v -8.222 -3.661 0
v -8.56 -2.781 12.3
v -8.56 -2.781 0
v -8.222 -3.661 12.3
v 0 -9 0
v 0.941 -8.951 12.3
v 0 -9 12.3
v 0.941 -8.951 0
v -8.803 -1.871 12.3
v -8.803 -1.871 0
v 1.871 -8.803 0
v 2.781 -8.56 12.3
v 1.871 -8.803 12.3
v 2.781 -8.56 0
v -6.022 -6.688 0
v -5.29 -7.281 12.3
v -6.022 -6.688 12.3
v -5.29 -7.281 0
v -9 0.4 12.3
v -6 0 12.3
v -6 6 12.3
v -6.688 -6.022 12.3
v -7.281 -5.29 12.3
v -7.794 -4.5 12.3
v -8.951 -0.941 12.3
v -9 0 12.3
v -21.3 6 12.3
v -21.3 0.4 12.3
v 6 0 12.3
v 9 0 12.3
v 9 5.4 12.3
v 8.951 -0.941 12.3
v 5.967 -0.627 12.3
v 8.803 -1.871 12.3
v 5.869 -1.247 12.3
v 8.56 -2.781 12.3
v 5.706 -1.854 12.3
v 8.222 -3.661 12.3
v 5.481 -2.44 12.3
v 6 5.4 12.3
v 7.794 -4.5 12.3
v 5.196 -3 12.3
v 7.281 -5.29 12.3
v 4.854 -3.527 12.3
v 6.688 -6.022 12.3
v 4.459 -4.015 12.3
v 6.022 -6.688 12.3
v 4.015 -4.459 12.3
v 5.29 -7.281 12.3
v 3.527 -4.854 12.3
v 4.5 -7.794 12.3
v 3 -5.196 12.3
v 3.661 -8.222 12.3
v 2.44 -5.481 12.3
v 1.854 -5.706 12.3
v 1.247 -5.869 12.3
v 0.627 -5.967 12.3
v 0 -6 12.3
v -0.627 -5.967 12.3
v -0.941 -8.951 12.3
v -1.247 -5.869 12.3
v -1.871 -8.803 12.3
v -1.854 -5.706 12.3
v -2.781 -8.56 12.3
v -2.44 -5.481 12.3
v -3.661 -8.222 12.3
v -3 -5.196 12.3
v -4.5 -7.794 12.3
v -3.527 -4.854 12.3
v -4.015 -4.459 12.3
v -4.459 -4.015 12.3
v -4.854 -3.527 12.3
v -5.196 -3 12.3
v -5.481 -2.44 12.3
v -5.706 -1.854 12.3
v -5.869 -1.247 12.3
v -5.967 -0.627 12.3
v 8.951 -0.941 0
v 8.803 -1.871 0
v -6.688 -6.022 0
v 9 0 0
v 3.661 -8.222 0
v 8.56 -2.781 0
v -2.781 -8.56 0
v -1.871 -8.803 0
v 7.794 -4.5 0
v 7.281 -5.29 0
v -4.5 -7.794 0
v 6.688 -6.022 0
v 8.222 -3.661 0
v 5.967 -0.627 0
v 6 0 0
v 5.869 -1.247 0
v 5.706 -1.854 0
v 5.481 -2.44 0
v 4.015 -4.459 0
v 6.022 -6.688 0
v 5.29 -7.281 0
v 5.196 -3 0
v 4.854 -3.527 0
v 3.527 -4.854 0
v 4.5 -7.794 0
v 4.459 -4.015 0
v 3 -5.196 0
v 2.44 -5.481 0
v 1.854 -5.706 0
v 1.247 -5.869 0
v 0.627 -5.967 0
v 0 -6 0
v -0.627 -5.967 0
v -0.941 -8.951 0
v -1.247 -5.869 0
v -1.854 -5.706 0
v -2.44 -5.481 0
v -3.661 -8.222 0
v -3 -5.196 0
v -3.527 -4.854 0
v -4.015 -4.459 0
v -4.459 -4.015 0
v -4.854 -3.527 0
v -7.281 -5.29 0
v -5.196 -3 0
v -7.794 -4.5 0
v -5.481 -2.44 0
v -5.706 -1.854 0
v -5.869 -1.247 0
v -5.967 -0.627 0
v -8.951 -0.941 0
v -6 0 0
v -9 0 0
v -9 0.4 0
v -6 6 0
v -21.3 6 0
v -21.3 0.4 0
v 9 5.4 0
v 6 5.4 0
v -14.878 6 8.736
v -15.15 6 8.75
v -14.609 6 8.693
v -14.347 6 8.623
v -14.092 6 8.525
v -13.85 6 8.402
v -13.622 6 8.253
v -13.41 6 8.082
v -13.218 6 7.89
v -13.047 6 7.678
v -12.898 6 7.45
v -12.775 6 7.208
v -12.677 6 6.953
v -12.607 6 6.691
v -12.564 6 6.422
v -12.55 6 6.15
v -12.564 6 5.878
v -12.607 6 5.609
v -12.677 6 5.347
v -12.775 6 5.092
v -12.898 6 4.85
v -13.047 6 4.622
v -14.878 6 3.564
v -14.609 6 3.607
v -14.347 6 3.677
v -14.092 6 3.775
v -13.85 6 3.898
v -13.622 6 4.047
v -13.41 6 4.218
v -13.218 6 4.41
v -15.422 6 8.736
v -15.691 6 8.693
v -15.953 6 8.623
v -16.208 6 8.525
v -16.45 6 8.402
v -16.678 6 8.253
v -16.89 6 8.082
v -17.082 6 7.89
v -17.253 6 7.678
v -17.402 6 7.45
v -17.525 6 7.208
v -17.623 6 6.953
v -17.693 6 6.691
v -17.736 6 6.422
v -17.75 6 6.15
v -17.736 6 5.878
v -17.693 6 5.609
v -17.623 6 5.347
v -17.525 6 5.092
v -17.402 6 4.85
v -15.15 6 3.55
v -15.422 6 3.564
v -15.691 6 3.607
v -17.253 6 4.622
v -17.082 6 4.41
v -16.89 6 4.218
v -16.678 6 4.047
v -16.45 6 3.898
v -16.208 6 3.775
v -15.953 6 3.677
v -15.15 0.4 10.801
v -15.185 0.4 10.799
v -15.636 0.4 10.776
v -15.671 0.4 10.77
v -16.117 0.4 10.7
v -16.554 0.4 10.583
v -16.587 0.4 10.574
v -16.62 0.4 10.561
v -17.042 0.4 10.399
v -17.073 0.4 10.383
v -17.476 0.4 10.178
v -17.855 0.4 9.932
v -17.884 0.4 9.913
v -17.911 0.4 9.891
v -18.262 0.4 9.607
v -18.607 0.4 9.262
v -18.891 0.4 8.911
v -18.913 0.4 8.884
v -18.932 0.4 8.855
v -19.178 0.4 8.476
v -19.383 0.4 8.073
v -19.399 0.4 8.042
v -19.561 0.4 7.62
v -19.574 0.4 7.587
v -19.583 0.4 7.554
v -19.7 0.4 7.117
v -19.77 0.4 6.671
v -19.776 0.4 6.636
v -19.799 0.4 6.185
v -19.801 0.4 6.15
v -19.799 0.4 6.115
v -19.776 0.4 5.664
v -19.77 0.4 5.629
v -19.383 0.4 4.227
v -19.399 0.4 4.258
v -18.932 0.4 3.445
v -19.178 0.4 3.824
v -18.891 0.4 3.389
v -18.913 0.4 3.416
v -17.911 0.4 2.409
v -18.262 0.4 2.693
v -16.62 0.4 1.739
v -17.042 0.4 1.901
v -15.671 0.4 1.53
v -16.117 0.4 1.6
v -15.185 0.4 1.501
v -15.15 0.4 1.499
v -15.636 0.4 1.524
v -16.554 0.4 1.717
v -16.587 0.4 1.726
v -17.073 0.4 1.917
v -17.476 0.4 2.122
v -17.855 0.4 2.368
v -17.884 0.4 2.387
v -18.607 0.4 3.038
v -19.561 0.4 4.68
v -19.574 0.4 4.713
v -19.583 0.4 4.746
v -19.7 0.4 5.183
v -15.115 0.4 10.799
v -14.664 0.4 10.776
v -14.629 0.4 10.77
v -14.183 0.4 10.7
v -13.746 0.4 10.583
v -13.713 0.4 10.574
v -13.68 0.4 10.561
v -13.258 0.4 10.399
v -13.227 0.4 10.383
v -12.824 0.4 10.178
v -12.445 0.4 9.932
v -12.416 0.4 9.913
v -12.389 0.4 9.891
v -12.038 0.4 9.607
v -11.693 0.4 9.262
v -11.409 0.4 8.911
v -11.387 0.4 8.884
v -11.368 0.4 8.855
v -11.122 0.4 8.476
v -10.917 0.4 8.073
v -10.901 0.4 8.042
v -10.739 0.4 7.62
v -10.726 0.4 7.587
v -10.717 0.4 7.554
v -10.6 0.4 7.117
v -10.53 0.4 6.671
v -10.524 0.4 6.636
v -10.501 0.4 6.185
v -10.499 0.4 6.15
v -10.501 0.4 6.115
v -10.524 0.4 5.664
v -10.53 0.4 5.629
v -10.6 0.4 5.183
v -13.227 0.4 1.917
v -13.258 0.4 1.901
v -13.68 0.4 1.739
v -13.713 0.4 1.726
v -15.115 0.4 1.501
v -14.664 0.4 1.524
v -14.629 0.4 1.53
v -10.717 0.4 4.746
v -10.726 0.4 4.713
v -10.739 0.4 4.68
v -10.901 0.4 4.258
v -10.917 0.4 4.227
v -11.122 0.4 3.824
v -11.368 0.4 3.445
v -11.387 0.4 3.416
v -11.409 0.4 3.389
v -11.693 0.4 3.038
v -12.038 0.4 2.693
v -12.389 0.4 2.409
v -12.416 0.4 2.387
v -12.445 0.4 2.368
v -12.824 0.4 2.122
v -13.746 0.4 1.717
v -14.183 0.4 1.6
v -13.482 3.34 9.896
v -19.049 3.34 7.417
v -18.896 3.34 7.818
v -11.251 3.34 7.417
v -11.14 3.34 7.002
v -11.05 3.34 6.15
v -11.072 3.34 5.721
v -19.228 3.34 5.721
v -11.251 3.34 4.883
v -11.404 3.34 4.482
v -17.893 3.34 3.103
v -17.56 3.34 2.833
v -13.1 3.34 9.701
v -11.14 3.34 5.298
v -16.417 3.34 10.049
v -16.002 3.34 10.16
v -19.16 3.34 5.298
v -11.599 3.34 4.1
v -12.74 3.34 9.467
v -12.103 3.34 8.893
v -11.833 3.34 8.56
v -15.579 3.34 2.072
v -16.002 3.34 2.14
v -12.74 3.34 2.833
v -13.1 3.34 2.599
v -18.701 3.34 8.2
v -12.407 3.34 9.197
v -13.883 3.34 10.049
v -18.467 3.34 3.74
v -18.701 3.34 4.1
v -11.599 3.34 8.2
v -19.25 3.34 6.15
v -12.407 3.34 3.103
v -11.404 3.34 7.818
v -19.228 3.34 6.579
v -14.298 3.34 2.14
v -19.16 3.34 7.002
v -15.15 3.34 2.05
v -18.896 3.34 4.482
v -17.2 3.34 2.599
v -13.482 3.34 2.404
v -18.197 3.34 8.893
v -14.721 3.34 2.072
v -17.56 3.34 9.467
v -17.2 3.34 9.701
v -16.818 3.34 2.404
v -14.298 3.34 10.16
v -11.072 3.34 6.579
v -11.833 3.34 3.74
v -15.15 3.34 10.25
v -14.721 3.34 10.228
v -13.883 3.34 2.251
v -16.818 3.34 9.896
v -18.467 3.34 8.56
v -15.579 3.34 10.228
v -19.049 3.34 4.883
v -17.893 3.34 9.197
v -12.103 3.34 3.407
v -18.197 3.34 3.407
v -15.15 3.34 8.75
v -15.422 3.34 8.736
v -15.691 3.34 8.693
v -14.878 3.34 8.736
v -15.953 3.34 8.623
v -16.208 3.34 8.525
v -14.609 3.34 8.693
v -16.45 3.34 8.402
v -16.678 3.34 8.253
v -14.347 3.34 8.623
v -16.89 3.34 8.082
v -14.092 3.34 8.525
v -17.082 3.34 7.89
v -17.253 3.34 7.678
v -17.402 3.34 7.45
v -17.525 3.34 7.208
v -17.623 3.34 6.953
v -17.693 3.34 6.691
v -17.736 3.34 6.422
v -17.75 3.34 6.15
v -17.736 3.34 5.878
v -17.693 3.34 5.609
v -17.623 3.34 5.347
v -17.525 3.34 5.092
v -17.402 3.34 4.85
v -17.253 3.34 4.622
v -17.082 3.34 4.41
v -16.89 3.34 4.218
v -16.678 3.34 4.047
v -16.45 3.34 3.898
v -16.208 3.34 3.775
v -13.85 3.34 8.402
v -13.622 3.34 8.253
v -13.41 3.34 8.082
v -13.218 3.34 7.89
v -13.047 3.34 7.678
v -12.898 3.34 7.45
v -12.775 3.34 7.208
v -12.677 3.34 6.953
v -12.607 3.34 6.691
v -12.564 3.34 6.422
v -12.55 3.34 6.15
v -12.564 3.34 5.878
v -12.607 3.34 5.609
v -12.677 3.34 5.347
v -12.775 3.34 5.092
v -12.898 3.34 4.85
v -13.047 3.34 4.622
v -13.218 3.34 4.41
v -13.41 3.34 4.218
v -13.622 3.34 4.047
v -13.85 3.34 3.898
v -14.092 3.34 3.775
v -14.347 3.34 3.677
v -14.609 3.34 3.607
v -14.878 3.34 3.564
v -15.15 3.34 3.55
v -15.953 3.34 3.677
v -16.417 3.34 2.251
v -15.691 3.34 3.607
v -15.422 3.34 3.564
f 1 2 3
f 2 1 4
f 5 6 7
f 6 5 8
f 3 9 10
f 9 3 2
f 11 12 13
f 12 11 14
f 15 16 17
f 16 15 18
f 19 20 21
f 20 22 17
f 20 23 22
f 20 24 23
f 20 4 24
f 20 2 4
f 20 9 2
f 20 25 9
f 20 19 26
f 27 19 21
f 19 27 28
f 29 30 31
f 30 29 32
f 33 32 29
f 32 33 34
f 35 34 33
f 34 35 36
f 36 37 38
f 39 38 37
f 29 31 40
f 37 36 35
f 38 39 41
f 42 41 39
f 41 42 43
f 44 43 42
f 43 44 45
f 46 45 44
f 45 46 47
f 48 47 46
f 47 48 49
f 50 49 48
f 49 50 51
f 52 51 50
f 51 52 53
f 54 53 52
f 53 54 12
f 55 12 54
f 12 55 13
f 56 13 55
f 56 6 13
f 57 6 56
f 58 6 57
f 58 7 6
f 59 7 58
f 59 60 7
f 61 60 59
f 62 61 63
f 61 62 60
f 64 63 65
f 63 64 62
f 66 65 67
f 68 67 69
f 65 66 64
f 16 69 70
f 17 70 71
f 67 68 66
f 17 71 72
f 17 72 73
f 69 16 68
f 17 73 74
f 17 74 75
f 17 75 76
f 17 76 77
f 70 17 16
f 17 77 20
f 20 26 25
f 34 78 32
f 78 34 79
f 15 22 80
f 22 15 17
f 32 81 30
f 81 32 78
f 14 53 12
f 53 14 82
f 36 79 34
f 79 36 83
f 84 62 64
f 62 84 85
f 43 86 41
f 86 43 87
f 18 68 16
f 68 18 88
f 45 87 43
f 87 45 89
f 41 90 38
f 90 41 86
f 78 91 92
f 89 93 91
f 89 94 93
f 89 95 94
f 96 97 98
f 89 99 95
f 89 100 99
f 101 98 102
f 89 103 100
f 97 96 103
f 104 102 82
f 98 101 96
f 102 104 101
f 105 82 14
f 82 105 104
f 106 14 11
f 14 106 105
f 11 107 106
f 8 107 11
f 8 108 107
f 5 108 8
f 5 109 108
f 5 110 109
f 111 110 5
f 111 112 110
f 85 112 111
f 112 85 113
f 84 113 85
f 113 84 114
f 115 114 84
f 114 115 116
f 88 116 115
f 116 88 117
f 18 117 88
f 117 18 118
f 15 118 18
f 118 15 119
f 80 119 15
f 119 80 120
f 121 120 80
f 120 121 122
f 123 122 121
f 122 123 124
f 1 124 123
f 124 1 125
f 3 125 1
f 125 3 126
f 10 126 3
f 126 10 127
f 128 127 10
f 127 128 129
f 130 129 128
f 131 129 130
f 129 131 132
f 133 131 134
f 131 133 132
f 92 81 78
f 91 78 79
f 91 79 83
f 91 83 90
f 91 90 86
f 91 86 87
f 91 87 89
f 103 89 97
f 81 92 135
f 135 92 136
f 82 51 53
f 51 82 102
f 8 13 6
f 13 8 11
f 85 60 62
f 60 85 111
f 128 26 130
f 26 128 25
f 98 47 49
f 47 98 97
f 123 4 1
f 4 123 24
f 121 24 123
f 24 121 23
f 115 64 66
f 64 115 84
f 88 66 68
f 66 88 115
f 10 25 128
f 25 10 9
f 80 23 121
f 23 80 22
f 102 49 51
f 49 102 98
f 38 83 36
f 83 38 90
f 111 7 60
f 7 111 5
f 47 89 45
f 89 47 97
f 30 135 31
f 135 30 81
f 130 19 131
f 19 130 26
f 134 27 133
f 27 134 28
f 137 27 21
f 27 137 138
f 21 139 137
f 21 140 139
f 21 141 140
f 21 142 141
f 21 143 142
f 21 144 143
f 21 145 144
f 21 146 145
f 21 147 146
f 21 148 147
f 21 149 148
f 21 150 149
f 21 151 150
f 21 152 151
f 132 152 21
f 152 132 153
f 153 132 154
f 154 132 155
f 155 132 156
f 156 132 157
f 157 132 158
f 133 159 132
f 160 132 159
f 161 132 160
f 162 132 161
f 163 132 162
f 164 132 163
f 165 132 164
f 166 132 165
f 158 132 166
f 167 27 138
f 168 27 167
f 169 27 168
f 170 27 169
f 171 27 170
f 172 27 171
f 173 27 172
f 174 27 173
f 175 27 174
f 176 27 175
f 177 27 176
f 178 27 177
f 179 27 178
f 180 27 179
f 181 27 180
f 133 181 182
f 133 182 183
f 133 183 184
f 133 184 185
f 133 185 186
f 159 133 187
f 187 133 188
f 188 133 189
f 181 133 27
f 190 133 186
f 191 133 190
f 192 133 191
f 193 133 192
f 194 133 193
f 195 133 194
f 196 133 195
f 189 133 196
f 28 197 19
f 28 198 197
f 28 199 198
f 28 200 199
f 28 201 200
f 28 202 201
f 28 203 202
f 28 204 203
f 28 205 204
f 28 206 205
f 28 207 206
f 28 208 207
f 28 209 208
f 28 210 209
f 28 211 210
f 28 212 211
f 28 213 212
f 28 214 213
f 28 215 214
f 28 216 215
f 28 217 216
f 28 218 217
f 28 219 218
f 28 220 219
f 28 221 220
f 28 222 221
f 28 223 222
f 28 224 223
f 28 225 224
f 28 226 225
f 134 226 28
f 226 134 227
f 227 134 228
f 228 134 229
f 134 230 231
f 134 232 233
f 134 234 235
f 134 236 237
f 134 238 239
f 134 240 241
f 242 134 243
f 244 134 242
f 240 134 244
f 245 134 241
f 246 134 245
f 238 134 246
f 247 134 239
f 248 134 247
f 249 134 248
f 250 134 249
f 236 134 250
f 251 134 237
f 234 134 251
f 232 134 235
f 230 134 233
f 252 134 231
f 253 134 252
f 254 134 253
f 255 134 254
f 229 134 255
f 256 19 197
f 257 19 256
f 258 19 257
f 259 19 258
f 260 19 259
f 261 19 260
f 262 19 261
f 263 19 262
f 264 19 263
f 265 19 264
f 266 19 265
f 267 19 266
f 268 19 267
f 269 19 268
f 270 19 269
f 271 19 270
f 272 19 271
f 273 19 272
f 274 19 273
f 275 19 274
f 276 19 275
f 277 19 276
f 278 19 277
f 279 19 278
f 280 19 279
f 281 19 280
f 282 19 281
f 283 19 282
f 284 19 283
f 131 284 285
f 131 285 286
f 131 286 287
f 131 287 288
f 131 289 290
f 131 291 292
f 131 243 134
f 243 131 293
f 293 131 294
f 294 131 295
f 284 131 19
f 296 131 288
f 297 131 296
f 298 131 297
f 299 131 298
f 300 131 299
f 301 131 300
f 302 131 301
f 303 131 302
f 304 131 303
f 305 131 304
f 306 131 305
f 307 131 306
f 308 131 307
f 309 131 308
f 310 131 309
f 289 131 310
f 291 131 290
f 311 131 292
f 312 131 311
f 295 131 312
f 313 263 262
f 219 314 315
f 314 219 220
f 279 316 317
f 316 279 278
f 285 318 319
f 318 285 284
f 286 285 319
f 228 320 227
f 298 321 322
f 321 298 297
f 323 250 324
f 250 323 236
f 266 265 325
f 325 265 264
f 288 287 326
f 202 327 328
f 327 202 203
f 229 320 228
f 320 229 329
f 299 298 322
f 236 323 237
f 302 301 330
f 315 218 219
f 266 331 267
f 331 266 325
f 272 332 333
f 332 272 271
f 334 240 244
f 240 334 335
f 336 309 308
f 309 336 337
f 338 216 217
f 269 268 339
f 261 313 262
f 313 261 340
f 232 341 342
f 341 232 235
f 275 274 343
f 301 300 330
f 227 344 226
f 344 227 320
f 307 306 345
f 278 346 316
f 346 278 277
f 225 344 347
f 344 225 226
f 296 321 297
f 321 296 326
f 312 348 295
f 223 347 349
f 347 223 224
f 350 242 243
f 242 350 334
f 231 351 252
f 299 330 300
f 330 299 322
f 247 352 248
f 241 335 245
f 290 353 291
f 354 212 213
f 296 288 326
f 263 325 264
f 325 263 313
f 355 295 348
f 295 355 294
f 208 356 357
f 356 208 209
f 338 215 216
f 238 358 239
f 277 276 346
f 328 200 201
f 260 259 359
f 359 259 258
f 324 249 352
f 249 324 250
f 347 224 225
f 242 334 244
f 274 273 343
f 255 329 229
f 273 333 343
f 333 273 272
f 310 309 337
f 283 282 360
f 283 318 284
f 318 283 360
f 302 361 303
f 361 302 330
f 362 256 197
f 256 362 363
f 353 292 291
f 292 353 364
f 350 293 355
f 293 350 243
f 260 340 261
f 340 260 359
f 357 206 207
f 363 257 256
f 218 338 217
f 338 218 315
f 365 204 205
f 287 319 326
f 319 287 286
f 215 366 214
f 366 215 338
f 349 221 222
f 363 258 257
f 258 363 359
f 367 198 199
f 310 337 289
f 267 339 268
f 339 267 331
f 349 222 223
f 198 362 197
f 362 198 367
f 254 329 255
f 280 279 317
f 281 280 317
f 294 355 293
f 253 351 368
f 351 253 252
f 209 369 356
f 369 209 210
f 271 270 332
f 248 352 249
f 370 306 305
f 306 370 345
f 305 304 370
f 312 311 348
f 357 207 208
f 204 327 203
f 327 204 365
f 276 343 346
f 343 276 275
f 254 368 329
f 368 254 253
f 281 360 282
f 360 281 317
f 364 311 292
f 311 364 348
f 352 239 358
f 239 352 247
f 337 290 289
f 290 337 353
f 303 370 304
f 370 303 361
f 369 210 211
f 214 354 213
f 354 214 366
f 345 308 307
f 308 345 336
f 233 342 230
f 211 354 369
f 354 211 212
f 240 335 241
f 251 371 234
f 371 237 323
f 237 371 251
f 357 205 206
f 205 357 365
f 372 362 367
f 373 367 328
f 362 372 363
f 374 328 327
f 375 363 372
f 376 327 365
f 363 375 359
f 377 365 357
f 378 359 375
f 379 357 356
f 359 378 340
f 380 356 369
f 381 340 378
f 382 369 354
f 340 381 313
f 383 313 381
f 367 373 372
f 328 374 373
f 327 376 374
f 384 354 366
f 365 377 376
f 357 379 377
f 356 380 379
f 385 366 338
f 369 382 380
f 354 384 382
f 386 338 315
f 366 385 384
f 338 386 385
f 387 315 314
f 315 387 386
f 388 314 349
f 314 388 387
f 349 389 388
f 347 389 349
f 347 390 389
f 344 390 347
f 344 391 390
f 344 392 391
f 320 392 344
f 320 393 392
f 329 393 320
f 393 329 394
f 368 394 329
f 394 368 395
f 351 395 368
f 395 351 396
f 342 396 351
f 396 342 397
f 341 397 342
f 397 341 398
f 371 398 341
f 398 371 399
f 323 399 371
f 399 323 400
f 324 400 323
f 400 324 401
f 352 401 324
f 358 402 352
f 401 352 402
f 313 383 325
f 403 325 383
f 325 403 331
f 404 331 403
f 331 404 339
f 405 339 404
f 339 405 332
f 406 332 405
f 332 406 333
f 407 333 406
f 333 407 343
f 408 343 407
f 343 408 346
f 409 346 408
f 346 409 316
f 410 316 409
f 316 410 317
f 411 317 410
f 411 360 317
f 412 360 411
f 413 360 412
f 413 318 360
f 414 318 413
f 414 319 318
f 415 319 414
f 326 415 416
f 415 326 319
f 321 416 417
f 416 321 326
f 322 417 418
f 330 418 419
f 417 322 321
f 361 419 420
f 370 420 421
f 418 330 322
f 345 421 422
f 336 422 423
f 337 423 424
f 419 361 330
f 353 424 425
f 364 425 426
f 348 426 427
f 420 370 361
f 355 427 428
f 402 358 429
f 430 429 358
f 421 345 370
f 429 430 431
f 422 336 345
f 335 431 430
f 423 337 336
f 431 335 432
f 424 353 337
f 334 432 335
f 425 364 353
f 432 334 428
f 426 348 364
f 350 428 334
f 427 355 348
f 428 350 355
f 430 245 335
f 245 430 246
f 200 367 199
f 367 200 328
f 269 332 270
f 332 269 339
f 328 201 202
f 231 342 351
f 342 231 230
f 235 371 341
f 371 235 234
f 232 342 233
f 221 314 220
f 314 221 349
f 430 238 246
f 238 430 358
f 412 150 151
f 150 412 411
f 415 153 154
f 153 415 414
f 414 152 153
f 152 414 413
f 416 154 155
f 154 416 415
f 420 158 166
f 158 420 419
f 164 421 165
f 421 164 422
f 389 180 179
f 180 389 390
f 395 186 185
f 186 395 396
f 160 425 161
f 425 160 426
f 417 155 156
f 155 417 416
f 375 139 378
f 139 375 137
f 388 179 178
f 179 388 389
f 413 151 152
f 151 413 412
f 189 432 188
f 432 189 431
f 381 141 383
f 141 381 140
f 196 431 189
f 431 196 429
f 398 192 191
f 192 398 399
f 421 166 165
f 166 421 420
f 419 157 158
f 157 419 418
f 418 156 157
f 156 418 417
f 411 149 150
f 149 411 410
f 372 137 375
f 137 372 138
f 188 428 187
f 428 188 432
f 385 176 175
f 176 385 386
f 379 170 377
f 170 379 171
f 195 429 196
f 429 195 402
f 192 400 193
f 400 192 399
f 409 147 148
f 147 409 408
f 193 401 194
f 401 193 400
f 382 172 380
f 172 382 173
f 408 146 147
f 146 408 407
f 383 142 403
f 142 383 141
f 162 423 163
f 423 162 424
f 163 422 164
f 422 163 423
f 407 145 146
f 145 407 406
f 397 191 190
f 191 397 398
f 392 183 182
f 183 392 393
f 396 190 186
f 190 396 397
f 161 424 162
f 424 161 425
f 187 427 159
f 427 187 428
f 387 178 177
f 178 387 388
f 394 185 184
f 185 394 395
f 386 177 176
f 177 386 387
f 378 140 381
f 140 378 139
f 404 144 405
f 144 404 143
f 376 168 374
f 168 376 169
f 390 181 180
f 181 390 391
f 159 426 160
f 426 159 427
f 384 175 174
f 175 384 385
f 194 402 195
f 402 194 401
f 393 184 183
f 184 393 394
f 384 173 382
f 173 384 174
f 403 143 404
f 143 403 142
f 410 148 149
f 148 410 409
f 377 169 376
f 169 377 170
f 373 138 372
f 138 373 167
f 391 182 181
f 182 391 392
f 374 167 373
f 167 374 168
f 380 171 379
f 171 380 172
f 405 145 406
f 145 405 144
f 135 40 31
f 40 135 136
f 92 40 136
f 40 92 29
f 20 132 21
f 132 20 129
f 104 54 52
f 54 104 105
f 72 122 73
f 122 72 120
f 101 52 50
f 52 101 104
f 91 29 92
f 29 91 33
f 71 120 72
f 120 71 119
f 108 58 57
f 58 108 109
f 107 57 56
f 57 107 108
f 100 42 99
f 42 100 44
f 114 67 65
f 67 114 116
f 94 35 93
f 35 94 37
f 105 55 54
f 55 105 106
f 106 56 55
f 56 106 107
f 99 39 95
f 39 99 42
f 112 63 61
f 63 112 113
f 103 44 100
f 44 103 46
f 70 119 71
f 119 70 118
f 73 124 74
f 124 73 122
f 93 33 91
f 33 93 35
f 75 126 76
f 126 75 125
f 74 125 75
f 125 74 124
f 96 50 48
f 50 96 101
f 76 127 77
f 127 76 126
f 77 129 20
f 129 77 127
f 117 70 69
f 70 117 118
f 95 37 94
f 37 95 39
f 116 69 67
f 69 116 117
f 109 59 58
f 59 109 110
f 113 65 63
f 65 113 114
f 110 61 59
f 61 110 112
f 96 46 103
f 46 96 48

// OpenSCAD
// Cutomizable cable fastener by Timoi Jan 18th 2017
// Customisable parameters for Thingverse
cable_diameter = 12; // [4:32]
min_part_thickness = 3; // [1:6]
screw_hat_thicknes = 2; // [0:4]  
screw_hat_witdh = 7; // [2:12] 
screw_hole_size = 4; // [2:8]
number_of_fasteners = 1; // [1,2,4,6,8,10,12,14,16,18,20]

// Hidden options not visible at Thingsverse
hidden_option_cableR   = cable_diameter/2*1;
hidden_option_minT = min(min_part_thickness, hidden_option_cableR )*1;
hidden_option_tol = 0.6*1;
hidden_option_screwL    =  40*1;
$fn = 60*1;


// Calculation of intermediate parameters (complicated refactoring)

screwW    = screw_hole_size/2+hidden_option_tol;
screwHatW = max(screw_hat_witdh/2+hidden_option_tol, screwW);
screwHatH = screw_hat_thicknes+hidden_option_tol;

cableRingT = max(hidden_option_cableR/5, hidden_option_minT);
screwHoleTol = screwHatH/2;
screwToCableL = screwHatW*1.5+1*hidden_option_cableR+hidden_option_minT;
ringR = hidden_option_cableR + cableRingT;
ringW = screwHatW*3;
plateL = ringW; //screwToCableL; //3*screwHatW;

halfspaceA = ringW*5;
gridGap = min_part_thickness*1;
gridZ = cable_diameter+gridGap+min_part_thickness;
gridX = gridZ+plateL*2+min_part_thickness+gridGap;


// Creating 3D model
// Secong union is removed from the one resulting ready parts
module screw(){

    // Screw which size is made larger by tol
    cylinder(screwHatH+hidden_option_tol,screwHatW++hidden_option_tol,screwHatW);
    cylinder(hidden_option_screwL,screwW,screwW);
  }

module fastener() {
    
difference() {
    
    // Creating wanted shape and a bit more which is removed with boolean operations
    union() {
        // Outer half ring as cylinder
        cylinder(ringW,ringR,ringR);
        
        // Lower vertical part
        translate([-ringR,0,0]) { cube([ringR*2,ringR,ringW]);}
        //translate([0,0,0]) { cube([ringR,ringR-min_part_thickness,ringW]);}
        
        // Lower vertical part on screw side
        translate([-plateL-ringR,+ringR-2*cableRingT-screwHatH,0]) { 
                cube([plateL,cableRingT+screwHatH,ringW]);}  
    }
     
    // Creating shape to remove unwanted part from aboe
    union() {
        
        // Screw made larger by tol and placed correctly
        translate([-screwToCableL,hidden_option_cableR-cableRingT-screwHatH*1.1,ringW/2]) { 
            rotate(270, [1,0,0]) { screw(); }
          }
               
        // Half space i.e. wall
          translate([-halfspaceA/2, hidden_option_cableR, -halfspaceA/2+ringW/2]) { 
              cube([halfspaceA,halfspaceA,halfspaceA]);}
          
         translate([0,ringR-min_part_thickness*1-hidden_option_tol,-ringR/2]) { 
             cube([2*ringR,ringR,ringW*2]);}
          
        // Place where cable would be  
        translate([-hidden_option_cableR,0,-ringW/2]) { cube([hidden_option_cableR*2,ringW*2,2*ringW]);}
        translate([0,0,-ringW/2]) { cylinder(ringW*2,hidden_option_cableR, hidden_option_cableR);}
   }
}
}



module column_of_fasteners()  { 
    for (a =[1:number_of_fasteners/2]) { 
        translate([0,-a*gridZ,0]) { fastener();}
    } 
}

if (number_of_fasteners>1) { 
    column_of_fasteners();
    mirror([1,0,0]) { translate([gridX,0,0]) { column_of_fasteners();}}
} else {
    fastener();
}
